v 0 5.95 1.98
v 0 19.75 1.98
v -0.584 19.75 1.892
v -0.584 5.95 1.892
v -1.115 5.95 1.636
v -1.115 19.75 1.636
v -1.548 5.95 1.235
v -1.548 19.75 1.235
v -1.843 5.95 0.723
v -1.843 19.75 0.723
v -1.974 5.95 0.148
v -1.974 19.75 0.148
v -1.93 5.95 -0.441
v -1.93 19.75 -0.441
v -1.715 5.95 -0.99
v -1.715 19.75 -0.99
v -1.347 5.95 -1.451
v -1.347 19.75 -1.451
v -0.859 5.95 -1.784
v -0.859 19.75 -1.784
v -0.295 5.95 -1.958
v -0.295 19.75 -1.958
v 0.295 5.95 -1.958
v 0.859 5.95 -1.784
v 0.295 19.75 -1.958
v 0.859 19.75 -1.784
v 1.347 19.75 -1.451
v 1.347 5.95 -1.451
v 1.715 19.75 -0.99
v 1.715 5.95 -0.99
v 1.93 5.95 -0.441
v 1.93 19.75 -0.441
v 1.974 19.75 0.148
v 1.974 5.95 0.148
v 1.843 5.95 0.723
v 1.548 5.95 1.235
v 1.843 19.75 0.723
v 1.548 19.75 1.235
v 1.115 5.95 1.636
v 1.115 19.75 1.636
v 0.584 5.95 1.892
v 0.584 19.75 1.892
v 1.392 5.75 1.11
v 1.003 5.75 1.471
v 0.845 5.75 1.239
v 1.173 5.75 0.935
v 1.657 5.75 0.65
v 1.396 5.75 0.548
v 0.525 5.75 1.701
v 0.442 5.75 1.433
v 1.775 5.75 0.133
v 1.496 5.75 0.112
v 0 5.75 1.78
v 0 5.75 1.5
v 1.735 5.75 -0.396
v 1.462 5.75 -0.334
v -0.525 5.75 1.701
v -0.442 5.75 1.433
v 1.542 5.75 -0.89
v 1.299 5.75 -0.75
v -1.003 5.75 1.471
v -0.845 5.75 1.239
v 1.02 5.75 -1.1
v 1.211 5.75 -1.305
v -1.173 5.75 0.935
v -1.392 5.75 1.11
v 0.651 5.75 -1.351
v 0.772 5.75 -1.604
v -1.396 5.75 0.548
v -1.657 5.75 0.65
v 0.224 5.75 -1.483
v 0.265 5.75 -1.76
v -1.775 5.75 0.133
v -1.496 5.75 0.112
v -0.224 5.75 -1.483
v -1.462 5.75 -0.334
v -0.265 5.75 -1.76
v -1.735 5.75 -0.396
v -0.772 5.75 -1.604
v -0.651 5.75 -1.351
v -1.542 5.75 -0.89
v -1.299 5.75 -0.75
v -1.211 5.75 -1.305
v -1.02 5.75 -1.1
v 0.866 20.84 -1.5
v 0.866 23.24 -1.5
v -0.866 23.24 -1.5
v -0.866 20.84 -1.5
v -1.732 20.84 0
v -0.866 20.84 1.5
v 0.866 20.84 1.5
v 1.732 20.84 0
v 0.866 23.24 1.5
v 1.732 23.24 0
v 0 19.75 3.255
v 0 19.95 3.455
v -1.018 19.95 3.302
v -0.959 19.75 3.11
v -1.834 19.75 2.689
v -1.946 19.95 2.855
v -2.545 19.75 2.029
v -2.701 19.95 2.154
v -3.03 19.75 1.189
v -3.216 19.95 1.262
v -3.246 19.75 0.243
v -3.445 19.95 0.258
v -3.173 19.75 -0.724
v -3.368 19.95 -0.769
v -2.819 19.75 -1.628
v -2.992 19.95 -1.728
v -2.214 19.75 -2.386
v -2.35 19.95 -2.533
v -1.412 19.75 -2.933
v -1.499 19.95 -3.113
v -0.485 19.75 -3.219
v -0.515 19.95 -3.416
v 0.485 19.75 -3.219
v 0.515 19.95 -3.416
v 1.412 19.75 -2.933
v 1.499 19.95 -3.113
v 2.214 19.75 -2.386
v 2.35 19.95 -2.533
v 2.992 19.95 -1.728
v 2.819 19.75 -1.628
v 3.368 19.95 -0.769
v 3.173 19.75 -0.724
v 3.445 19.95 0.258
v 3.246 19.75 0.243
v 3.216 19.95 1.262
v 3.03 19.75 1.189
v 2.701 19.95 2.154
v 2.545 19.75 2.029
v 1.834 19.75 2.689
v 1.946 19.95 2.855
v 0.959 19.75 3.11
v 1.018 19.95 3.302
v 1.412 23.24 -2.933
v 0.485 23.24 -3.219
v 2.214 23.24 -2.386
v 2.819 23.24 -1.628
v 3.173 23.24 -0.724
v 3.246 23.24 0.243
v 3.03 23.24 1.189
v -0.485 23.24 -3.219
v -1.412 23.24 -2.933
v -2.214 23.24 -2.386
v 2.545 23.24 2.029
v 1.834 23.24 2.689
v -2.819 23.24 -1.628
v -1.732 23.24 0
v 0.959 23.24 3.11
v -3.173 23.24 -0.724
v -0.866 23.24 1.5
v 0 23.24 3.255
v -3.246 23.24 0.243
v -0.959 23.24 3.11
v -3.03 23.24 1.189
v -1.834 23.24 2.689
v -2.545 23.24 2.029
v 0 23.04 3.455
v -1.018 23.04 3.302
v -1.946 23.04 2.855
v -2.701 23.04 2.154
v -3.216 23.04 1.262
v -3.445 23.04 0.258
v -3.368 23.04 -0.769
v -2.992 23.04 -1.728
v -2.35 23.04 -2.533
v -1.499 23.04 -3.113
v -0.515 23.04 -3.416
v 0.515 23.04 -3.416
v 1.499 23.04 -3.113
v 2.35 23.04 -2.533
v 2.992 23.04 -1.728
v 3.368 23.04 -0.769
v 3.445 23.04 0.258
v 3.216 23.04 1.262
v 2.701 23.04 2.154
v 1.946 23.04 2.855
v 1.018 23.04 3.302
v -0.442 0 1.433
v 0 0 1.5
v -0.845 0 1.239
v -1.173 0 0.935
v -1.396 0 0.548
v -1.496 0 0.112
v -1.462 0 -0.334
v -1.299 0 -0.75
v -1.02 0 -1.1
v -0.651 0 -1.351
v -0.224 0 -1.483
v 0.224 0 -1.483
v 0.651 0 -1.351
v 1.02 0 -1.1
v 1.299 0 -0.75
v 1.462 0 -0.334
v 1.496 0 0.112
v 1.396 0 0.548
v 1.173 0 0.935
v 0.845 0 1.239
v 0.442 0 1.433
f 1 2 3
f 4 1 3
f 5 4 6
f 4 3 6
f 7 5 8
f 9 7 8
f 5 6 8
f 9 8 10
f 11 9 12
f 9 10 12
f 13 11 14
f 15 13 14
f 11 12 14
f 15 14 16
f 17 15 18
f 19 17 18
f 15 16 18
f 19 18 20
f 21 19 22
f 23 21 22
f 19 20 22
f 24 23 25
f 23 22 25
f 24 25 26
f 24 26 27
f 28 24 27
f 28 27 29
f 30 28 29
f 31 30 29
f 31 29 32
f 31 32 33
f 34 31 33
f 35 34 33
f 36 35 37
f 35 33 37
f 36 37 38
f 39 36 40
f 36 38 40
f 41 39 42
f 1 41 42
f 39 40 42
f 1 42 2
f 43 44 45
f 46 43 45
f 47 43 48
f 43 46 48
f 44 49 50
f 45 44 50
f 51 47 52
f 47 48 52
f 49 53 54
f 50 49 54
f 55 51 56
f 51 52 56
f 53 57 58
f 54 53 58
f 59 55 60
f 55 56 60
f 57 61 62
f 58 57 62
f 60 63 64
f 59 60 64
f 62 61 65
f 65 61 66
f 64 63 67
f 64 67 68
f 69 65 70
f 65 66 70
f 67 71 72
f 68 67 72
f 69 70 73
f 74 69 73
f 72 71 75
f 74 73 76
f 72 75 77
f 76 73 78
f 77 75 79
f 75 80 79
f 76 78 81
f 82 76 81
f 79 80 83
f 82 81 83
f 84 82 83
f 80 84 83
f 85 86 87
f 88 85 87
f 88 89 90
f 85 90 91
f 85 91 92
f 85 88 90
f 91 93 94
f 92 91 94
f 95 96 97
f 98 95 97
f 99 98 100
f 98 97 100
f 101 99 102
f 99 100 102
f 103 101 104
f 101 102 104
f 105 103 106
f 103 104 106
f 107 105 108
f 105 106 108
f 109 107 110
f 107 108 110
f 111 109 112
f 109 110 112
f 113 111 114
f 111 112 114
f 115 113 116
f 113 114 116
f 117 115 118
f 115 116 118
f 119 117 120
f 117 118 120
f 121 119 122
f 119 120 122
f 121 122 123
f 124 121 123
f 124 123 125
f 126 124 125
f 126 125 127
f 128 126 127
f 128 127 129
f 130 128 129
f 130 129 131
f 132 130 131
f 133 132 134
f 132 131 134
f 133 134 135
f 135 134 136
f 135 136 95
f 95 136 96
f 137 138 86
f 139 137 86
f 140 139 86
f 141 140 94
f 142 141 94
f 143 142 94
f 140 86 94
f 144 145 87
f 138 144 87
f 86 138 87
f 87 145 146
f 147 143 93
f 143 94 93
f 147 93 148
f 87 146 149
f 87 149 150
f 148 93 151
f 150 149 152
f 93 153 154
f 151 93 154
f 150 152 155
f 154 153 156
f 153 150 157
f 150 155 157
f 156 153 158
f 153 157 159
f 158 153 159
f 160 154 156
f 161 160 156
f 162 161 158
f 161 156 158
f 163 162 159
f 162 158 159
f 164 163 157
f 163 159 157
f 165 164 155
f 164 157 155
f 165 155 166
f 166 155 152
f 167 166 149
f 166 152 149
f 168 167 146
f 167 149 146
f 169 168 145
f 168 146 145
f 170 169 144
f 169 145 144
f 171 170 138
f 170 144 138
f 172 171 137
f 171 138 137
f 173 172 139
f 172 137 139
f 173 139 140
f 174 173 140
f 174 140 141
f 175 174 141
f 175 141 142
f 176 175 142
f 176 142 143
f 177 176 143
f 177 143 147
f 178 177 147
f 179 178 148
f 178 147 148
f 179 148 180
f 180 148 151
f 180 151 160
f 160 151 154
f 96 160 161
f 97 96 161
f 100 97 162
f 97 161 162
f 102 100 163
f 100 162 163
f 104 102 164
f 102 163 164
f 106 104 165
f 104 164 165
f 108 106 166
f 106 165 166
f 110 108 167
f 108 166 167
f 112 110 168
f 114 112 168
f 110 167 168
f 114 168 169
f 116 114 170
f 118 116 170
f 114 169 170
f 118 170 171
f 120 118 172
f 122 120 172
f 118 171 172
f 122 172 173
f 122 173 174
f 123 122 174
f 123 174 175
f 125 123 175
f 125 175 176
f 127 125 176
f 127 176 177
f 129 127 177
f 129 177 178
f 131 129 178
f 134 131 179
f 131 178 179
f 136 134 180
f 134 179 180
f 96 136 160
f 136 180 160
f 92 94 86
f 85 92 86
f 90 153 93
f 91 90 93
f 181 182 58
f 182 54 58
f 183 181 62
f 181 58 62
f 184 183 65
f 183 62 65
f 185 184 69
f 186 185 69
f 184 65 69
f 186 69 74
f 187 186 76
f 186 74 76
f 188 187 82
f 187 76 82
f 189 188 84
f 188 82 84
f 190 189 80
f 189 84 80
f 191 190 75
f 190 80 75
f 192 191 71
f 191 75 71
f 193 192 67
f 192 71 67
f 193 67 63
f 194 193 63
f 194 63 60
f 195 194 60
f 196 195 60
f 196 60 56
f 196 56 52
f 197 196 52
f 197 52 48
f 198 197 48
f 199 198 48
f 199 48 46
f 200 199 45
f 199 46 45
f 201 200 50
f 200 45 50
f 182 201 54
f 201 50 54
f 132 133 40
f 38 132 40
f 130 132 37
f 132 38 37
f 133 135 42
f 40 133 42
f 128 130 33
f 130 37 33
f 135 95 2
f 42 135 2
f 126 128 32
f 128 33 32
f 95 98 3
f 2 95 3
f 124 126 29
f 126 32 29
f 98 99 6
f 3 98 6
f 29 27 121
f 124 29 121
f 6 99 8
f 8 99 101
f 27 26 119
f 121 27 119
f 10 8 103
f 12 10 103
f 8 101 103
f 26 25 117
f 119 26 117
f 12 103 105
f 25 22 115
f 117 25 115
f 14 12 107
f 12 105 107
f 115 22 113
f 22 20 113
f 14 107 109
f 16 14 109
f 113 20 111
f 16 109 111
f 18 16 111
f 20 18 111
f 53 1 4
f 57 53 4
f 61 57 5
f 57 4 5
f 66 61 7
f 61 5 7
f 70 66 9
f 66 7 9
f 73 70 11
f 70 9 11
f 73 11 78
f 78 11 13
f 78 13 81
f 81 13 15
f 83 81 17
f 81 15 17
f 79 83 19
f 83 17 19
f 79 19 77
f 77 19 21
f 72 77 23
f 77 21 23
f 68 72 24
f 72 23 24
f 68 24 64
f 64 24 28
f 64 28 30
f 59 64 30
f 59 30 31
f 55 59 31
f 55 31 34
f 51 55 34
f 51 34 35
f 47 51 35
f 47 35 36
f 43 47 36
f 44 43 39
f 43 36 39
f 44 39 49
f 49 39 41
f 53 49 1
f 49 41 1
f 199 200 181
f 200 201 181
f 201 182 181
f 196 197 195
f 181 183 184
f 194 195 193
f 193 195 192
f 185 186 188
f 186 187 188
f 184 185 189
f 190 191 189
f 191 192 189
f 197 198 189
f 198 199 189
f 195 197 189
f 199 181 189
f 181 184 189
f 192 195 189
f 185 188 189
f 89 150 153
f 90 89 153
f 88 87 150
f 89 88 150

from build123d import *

# Parameters (mm, degrees)
CUT_EXTRUDE1_DEPTH = 2.4
CHAMFER1_SIZE      = 0.2


with BuildPart() as part:
    # Sketch1 → Revolve1 (revolve)
    with BuildSketch(Plane.XY, mode=Mode.PRIVATE) as revolve1_sk:
        Polygon((0, 0), (1.5, 0), (1.5, 5.75), (1.98, 5.75), (1.98, 19.75), (3.455, 19.75), (3.455, 23.24), (0, 23.24), align=None)
    revolve(revolve1_sk.sketch.rotate(Axis((0, 23.24, 0), (0, -1, 0)), 90), axis=Axis((0, 23.24, 0), (0, -1, 0)))

    # Sketch2 → Cut-Extrude1 (cut)
    with BuildSketch(Plane(origin=(0, 23.24, 0), x_dir=(1, 0, 0), z_dir=(0, 1, 0))):
        Polygon((1.732050808, 0), (0.866025404, 1.5), (-0.866025404, 1.5), (-1.732050808, 0), (-0.866025404, -1.5), (0.866025404, -1.5), align=None)
    extrude(amount=-CUT_EXTRUDE1_DEPTH, mode=Mode.SUBTRACT)

    # Chamfer1
    chamfer1_edges = [part.edges().sort_by_distance(p)[0] for p in [
        (0, 23.24, -3.455),
        (0, 19.75, -3.455),
        (0, 5.75, -1.98),
    ]]
    chamfer(chamfer1_edges, length=CHAMFER1_SIZE)


solid = part.part
